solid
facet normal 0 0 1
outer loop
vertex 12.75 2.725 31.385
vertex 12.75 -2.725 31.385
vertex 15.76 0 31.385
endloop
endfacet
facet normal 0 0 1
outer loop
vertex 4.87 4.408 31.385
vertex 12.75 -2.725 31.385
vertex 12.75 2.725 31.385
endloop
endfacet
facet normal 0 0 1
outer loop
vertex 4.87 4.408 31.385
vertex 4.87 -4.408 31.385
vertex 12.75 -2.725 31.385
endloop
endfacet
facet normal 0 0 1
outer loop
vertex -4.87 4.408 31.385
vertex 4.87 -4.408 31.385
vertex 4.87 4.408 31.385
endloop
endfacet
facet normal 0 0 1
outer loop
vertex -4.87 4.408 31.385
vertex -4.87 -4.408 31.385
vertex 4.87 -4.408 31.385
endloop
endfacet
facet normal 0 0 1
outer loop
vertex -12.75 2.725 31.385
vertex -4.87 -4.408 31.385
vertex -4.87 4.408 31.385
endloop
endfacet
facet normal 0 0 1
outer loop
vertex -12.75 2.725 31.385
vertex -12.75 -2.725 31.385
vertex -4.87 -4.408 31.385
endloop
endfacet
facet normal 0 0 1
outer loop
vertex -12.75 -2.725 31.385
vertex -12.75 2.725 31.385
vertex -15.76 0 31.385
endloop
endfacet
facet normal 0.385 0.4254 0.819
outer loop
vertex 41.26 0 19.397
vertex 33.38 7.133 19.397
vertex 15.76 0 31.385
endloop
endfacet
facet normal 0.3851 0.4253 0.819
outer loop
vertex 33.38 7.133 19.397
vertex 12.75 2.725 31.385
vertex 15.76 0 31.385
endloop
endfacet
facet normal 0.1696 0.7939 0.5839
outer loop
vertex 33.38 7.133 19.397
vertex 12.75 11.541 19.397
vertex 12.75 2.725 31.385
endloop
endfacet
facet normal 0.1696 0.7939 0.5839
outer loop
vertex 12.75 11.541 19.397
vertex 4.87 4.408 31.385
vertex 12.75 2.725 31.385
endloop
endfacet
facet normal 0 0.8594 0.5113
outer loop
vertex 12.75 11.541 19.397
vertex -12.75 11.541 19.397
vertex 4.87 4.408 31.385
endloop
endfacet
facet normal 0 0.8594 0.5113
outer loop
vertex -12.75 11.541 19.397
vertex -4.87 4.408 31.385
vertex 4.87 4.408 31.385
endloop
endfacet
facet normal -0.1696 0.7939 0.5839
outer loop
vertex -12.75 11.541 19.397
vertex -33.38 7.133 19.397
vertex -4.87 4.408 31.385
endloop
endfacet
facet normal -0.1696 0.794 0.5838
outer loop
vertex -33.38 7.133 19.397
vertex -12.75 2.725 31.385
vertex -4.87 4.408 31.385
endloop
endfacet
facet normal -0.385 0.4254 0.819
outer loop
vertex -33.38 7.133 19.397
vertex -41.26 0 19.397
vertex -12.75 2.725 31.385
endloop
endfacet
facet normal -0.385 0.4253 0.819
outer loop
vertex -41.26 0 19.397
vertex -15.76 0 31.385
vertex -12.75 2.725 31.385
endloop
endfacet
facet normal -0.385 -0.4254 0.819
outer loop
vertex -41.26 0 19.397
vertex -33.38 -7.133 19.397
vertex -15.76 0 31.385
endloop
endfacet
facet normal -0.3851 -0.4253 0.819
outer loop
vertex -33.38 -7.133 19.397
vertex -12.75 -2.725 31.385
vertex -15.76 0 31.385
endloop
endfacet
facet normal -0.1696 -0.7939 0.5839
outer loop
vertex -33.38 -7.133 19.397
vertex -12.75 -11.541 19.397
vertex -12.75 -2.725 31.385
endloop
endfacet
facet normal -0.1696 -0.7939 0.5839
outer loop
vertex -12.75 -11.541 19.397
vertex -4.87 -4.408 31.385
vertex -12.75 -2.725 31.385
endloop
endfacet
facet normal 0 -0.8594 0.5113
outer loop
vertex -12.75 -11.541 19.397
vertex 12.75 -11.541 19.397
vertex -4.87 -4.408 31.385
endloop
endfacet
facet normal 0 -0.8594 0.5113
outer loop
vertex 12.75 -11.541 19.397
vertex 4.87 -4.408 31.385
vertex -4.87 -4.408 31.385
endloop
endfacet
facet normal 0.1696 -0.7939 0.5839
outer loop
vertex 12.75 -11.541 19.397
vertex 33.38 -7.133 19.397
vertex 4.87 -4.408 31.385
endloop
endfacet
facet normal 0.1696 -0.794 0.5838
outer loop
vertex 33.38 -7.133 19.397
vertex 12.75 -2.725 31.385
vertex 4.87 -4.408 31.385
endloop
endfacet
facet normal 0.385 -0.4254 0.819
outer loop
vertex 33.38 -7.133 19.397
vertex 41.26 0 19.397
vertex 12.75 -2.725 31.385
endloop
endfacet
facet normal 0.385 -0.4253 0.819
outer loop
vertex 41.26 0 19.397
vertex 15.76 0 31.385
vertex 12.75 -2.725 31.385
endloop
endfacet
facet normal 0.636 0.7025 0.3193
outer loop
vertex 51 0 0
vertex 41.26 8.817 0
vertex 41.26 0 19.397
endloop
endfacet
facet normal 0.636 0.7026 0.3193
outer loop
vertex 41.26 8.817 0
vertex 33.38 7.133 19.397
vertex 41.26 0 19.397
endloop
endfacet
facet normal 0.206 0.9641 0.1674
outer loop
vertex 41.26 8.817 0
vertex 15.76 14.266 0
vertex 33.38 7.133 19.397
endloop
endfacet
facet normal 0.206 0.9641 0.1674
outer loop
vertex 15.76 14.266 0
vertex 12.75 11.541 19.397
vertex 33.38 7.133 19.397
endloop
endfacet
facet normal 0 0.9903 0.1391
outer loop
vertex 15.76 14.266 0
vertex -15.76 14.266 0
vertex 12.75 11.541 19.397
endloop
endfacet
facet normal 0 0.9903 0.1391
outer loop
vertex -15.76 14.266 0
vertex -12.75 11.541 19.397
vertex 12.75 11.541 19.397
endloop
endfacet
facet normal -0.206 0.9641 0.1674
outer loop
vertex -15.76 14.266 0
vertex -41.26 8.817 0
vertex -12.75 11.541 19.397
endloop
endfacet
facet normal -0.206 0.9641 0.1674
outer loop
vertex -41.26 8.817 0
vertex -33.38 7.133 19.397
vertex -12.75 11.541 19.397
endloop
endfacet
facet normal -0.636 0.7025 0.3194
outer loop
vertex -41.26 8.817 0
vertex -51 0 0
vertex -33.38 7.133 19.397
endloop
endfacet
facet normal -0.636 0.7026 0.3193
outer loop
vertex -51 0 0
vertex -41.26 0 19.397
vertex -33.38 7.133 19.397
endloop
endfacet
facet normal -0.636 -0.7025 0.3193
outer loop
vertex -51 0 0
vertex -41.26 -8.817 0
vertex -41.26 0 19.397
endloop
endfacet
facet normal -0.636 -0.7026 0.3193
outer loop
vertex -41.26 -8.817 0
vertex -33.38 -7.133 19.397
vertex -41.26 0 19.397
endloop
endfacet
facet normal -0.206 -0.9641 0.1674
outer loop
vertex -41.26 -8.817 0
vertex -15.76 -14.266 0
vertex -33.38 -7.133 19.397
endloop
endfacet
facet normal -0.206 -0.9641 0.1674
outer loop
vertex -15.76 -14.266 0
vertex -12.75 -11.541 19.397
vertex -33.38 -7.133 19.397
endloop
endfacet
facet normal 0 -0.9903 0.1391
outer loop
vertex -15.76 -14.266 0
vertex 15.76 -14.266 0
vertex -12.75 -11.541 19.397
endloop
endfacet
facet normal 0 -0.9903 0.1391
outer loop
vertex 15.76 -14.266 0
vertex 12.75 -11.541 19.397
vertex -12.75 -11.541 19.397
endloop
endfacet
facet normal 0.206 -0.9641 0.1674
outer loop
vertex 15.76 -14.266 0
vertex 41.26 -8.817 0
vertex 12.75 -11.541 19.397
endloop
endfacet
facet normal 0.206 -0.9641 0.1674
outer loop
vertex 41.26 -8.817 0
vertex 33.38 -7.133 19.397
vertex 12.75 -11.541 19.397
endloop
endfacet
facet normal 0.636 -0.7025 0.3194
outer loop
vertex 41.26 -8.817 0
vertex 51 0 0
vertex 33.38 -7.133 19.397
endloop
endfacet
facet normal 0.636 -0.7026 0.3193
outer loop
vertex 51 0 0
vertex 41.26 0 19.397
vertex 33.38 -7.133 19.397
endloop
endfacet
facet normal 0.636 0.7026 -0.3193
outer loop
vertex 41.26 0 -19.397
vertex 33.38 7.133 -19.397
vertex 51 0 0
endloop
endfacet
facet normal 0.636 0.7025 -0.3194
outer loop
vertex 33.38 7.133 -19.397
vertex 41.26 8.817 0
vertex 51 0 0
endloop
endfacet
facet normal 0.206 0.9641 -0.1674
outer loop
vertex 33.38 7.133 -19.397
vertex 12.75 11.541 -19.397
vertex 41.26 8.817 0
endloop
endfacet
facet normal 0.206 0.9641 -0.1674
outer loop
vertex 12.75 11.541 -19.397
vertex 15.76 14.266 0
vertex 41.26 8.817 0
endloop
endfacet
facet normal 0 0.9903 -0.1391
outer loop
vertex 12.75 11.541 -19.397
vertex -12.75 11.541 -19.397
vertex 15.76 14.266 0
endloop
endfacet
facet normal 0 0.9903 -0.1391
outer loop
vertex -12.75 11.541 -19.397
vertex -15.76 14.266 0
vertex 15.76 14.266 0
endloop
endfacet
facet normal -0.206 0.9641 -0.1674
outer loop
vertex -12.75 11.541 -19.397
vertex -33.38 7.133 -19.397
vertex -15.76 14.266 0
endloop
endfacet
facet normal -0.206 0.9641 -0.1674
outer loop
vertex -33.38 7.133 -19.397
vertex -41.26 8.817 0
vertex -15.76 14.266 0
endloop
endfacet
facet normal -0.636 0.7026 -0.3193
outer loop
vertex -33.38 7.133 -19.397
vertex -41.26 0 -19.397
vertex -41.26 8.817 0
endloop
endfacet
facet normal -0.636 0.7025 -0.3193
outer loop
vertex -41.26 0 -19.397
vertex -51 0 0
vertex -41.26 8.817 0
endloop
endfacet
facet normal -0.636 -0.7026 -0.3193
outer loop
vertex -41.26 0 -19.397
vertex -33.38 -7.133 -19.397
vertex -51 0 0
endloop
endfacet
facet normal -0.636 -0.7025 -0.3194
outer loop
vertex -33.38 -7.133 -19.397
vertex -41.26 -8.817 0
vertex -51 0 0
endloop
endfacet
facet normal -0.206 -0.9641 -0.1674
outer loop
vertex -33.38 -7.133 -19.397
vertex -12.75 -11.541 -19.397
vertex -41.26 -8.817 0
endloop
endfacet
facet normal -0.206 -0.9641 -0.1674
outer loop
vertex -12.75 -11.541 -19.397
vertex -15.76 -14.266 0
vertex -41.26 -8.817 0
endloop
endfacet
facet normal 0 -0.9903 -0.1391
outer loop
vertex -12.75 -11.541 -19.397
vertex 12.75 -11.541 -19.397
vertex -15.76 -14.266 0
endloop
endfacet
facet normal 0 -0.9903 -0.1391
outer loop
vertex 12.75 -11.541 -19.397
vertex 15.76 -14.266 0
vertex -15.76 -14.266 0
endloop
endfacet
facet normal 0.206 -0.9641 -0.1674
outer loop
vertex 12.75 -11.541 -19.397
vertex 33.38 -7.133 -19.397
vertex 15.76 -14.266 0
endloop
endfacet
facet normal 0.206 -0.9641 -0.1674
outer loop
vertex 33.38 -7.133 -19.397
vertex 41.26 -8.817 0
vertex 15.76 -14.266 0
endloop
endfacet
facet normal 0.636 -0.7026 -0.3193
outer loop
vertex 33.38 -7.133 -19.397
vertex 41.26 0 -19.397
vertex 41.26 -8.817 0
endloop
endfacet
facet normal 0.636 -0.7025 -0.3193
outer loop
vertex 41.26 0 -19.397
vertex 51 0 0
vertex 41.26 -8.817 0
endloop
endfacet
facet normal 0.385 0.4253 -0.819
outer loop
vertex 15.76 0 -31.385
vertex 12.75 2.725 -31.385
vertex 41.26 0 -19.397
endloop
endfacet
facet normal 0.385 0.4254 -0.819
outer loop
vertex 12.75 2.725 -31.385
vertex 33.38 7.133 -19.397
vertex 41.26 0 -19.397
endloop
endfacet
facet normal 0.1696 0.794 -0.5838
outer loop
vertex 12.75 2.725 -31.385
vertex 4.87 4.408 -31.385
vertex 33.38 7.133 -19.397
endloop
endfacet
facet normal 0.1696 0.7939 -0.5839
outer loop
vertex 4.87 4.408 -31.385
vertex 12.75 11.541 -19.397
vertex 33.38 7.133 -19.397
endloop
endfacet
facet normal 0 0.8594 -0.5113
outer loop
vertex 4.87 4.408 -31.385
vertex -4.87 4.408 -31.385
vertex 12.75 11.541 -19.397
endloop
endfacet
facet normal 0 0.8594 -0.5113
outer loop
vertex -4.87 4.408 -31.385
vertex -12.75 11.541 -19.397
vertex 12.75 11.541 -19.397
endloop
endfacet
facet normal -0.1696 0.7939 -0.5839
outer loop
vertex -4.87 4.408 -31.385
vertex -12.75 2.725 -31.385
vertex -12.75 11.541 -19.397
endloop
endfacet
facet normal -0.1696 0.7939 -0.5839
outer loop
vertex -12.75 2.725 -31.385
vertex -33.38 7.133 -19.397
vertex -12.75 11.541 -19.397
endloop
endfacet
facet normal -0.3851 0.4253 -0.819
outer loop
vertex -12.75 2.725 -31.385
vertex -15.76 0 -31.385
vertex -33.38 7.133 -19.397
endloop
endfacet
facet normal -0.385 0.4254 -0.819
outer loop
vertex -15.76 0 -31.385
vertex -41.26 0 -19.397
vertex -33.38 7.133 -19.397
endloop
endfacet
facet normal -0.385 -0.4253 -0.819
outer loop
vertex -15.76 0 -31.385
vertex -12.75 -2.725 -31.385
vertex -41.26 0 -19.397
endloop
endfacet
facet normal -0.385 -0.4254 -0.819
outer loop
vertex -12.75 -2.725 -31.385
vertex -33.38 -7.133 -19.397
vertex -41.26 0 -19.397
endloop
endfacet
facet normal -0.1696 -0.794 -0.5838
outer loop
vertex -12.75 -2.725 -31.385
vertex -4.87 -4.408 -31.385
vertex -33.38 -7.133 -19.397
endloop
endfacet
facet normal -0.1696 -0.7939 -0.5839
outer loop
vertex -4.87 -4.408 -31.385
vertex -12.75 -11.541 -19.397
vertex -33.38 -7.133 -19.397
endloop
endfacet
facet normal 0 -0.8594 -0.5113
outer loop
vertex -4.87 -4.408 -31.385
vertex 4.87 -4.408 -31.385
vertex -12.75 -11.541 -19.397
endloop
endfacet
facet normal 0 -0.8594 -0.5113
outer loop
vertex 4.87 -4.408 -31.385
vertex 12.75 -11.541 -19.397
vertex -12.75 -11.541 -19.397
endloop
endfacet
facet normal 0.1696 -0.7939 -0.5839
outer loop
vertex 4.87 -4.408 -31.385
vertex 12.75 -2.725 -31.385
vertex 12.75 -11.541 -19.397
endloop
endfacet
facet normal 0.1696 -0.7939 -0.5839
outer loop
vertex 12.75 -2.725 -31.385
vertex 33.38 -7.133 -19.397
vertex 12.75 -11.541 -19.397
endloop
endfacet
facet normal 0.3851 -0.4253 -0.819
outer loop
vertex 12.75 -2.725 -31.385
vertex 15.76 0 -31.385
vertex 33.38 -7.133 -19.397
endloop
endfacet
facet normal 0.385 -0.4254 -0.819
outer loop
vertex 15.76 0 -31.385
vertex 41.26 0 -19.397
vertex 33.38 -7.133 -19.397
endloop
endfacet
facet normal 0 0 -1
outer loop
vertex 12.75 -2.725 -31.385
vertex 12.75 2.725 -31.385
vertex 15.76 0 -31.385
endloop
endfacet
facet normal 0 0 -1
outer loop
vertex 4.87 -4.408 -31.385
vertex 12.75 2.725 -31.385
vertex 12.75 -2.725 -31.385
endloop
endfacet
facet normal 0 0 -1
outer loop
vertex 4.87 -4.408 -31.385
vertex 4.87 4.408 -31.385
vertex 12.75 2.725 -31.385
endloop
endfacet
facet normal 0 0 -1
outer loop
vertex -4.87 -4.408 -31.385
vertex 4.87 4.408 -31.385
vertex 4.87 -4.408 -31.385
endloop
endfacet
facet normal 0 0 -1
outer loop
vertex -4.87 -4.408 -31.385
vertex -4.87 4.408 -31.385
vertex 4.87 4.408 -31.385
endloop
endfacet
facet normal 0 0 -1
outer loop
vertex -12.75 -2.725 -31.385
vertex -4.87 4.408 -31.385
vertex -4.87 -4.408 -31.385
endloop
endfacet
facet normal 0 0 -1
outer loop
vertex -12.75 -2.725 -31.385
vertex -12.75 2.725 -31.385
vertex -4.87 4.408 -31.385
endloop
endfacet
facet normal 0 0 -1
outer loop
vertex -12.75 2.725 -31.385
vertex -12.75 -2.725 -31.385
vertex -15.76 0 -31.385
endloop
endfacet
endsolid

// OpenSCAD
// Generated by SolidPython 1.0.1 on 2020-07-29 00:46:52


scale(v = [17, 5, 11]) {
	sphere(r = 3);
}
/***********************************************
*********      SolidPython code:      **********
************************************************
 
# import packages: SolidPython
from solid import *
from solid.utils import *
from itertools import chain, combinations, permutations


class Resize:

    def __init__(self, scad_file):
        self.scad_file = scad_file
        #self.scad_file = import_scad(scad_file)
        # cone/cylinder param:
        self.r1 = 0
        self.r2 = 0
        self.h = 0
        # rectangular prism param:
        self.w = 0
        self.l = 0
        # ellipse param:
        self.r = 0

    # import OpenScad code (file name corresponds to shape)


    # classify shape + parameters
    def assign(self, param1, param2, param3):
        if self.scad_file == 'cone.scad':
            self.r1 = param1
            self.r2 = param2
            self.h = param3
        elif self.scad_file == 'cylinder.scad':
            self.r1 = param1
            self.r2 = param2
            self.h = param3
        elif self.scad_file == 'rectangularPrism.scad':
            self.h = param1
            self.l = param2
            self.w = param3
        else:
            self.r = param1
            self.h = param2

    # resize parameters
    def iterate(self):
        x = range(3, 20, 2)
        i = 1
        if self.scad_file == 'cone.scad':
            tempList = list(permutations(x, 2))
            for temp in tempList:
                param1 = temp[0]
                param2 = temp[1]
                filepath = 'produced_scad_files/' + 'cone' + str(param1) + '_' + str(param2) + '_' + '.scad'
                scad_render_to_file(cylinder(h=param1, r1=param2, r2=0), filepath)

        elif self.scad_file == 'cylinder.scad':
            tempList = list(permutations(x, 3))
            for temp in tempList:
                param1 = temp[0]
                param2 = temp[1]
                filepath = 'produced_scad_files/' + 'cylinder' + str(param1) + '_' + str(param2) + '_' + '.scad'
                scad_render_to_file(cylinder(h=param1, r1=param2, r2=param2), filepath)

        elif self.scad_file == 'rectangularPrism.scad':
            tempList = list(permutations(x, 3))
            for temp in tempList:
                param1 = temp[0]
                param2 = temp[1]
                param3 = temp[2]
                filepath = 'produced_scad_files/' + 'rectangularPrism' + str(param1) + '_' + str(param2) + '_' + str(
                    param3) + '.scad'
                scad_render_to_file(cube(size=(param1, param2, param3)), filepath)

        elif self.scad_file == 'ellipse.scad':
            tempList = list(permutations(x, 4))
            for temp in tempList:
                param1 = temp[0]
                param2 = temp[1]
                param3 = temp[2]
                param4 = temp[3]
                filepath = 'produced_scad_files/' + 'ellipse' + str(param1) + '_' + str(param2) + '_' + str(param3) + '_' + str(param4) + '.scad'
                scad_render_to_file(scale([param1, param2, param3])(sphere(r=param4)), filepath)

    def render_to_scadfile(self):
        scad_render_to_file(scad, 'example.scad') 
 
************************************************/
